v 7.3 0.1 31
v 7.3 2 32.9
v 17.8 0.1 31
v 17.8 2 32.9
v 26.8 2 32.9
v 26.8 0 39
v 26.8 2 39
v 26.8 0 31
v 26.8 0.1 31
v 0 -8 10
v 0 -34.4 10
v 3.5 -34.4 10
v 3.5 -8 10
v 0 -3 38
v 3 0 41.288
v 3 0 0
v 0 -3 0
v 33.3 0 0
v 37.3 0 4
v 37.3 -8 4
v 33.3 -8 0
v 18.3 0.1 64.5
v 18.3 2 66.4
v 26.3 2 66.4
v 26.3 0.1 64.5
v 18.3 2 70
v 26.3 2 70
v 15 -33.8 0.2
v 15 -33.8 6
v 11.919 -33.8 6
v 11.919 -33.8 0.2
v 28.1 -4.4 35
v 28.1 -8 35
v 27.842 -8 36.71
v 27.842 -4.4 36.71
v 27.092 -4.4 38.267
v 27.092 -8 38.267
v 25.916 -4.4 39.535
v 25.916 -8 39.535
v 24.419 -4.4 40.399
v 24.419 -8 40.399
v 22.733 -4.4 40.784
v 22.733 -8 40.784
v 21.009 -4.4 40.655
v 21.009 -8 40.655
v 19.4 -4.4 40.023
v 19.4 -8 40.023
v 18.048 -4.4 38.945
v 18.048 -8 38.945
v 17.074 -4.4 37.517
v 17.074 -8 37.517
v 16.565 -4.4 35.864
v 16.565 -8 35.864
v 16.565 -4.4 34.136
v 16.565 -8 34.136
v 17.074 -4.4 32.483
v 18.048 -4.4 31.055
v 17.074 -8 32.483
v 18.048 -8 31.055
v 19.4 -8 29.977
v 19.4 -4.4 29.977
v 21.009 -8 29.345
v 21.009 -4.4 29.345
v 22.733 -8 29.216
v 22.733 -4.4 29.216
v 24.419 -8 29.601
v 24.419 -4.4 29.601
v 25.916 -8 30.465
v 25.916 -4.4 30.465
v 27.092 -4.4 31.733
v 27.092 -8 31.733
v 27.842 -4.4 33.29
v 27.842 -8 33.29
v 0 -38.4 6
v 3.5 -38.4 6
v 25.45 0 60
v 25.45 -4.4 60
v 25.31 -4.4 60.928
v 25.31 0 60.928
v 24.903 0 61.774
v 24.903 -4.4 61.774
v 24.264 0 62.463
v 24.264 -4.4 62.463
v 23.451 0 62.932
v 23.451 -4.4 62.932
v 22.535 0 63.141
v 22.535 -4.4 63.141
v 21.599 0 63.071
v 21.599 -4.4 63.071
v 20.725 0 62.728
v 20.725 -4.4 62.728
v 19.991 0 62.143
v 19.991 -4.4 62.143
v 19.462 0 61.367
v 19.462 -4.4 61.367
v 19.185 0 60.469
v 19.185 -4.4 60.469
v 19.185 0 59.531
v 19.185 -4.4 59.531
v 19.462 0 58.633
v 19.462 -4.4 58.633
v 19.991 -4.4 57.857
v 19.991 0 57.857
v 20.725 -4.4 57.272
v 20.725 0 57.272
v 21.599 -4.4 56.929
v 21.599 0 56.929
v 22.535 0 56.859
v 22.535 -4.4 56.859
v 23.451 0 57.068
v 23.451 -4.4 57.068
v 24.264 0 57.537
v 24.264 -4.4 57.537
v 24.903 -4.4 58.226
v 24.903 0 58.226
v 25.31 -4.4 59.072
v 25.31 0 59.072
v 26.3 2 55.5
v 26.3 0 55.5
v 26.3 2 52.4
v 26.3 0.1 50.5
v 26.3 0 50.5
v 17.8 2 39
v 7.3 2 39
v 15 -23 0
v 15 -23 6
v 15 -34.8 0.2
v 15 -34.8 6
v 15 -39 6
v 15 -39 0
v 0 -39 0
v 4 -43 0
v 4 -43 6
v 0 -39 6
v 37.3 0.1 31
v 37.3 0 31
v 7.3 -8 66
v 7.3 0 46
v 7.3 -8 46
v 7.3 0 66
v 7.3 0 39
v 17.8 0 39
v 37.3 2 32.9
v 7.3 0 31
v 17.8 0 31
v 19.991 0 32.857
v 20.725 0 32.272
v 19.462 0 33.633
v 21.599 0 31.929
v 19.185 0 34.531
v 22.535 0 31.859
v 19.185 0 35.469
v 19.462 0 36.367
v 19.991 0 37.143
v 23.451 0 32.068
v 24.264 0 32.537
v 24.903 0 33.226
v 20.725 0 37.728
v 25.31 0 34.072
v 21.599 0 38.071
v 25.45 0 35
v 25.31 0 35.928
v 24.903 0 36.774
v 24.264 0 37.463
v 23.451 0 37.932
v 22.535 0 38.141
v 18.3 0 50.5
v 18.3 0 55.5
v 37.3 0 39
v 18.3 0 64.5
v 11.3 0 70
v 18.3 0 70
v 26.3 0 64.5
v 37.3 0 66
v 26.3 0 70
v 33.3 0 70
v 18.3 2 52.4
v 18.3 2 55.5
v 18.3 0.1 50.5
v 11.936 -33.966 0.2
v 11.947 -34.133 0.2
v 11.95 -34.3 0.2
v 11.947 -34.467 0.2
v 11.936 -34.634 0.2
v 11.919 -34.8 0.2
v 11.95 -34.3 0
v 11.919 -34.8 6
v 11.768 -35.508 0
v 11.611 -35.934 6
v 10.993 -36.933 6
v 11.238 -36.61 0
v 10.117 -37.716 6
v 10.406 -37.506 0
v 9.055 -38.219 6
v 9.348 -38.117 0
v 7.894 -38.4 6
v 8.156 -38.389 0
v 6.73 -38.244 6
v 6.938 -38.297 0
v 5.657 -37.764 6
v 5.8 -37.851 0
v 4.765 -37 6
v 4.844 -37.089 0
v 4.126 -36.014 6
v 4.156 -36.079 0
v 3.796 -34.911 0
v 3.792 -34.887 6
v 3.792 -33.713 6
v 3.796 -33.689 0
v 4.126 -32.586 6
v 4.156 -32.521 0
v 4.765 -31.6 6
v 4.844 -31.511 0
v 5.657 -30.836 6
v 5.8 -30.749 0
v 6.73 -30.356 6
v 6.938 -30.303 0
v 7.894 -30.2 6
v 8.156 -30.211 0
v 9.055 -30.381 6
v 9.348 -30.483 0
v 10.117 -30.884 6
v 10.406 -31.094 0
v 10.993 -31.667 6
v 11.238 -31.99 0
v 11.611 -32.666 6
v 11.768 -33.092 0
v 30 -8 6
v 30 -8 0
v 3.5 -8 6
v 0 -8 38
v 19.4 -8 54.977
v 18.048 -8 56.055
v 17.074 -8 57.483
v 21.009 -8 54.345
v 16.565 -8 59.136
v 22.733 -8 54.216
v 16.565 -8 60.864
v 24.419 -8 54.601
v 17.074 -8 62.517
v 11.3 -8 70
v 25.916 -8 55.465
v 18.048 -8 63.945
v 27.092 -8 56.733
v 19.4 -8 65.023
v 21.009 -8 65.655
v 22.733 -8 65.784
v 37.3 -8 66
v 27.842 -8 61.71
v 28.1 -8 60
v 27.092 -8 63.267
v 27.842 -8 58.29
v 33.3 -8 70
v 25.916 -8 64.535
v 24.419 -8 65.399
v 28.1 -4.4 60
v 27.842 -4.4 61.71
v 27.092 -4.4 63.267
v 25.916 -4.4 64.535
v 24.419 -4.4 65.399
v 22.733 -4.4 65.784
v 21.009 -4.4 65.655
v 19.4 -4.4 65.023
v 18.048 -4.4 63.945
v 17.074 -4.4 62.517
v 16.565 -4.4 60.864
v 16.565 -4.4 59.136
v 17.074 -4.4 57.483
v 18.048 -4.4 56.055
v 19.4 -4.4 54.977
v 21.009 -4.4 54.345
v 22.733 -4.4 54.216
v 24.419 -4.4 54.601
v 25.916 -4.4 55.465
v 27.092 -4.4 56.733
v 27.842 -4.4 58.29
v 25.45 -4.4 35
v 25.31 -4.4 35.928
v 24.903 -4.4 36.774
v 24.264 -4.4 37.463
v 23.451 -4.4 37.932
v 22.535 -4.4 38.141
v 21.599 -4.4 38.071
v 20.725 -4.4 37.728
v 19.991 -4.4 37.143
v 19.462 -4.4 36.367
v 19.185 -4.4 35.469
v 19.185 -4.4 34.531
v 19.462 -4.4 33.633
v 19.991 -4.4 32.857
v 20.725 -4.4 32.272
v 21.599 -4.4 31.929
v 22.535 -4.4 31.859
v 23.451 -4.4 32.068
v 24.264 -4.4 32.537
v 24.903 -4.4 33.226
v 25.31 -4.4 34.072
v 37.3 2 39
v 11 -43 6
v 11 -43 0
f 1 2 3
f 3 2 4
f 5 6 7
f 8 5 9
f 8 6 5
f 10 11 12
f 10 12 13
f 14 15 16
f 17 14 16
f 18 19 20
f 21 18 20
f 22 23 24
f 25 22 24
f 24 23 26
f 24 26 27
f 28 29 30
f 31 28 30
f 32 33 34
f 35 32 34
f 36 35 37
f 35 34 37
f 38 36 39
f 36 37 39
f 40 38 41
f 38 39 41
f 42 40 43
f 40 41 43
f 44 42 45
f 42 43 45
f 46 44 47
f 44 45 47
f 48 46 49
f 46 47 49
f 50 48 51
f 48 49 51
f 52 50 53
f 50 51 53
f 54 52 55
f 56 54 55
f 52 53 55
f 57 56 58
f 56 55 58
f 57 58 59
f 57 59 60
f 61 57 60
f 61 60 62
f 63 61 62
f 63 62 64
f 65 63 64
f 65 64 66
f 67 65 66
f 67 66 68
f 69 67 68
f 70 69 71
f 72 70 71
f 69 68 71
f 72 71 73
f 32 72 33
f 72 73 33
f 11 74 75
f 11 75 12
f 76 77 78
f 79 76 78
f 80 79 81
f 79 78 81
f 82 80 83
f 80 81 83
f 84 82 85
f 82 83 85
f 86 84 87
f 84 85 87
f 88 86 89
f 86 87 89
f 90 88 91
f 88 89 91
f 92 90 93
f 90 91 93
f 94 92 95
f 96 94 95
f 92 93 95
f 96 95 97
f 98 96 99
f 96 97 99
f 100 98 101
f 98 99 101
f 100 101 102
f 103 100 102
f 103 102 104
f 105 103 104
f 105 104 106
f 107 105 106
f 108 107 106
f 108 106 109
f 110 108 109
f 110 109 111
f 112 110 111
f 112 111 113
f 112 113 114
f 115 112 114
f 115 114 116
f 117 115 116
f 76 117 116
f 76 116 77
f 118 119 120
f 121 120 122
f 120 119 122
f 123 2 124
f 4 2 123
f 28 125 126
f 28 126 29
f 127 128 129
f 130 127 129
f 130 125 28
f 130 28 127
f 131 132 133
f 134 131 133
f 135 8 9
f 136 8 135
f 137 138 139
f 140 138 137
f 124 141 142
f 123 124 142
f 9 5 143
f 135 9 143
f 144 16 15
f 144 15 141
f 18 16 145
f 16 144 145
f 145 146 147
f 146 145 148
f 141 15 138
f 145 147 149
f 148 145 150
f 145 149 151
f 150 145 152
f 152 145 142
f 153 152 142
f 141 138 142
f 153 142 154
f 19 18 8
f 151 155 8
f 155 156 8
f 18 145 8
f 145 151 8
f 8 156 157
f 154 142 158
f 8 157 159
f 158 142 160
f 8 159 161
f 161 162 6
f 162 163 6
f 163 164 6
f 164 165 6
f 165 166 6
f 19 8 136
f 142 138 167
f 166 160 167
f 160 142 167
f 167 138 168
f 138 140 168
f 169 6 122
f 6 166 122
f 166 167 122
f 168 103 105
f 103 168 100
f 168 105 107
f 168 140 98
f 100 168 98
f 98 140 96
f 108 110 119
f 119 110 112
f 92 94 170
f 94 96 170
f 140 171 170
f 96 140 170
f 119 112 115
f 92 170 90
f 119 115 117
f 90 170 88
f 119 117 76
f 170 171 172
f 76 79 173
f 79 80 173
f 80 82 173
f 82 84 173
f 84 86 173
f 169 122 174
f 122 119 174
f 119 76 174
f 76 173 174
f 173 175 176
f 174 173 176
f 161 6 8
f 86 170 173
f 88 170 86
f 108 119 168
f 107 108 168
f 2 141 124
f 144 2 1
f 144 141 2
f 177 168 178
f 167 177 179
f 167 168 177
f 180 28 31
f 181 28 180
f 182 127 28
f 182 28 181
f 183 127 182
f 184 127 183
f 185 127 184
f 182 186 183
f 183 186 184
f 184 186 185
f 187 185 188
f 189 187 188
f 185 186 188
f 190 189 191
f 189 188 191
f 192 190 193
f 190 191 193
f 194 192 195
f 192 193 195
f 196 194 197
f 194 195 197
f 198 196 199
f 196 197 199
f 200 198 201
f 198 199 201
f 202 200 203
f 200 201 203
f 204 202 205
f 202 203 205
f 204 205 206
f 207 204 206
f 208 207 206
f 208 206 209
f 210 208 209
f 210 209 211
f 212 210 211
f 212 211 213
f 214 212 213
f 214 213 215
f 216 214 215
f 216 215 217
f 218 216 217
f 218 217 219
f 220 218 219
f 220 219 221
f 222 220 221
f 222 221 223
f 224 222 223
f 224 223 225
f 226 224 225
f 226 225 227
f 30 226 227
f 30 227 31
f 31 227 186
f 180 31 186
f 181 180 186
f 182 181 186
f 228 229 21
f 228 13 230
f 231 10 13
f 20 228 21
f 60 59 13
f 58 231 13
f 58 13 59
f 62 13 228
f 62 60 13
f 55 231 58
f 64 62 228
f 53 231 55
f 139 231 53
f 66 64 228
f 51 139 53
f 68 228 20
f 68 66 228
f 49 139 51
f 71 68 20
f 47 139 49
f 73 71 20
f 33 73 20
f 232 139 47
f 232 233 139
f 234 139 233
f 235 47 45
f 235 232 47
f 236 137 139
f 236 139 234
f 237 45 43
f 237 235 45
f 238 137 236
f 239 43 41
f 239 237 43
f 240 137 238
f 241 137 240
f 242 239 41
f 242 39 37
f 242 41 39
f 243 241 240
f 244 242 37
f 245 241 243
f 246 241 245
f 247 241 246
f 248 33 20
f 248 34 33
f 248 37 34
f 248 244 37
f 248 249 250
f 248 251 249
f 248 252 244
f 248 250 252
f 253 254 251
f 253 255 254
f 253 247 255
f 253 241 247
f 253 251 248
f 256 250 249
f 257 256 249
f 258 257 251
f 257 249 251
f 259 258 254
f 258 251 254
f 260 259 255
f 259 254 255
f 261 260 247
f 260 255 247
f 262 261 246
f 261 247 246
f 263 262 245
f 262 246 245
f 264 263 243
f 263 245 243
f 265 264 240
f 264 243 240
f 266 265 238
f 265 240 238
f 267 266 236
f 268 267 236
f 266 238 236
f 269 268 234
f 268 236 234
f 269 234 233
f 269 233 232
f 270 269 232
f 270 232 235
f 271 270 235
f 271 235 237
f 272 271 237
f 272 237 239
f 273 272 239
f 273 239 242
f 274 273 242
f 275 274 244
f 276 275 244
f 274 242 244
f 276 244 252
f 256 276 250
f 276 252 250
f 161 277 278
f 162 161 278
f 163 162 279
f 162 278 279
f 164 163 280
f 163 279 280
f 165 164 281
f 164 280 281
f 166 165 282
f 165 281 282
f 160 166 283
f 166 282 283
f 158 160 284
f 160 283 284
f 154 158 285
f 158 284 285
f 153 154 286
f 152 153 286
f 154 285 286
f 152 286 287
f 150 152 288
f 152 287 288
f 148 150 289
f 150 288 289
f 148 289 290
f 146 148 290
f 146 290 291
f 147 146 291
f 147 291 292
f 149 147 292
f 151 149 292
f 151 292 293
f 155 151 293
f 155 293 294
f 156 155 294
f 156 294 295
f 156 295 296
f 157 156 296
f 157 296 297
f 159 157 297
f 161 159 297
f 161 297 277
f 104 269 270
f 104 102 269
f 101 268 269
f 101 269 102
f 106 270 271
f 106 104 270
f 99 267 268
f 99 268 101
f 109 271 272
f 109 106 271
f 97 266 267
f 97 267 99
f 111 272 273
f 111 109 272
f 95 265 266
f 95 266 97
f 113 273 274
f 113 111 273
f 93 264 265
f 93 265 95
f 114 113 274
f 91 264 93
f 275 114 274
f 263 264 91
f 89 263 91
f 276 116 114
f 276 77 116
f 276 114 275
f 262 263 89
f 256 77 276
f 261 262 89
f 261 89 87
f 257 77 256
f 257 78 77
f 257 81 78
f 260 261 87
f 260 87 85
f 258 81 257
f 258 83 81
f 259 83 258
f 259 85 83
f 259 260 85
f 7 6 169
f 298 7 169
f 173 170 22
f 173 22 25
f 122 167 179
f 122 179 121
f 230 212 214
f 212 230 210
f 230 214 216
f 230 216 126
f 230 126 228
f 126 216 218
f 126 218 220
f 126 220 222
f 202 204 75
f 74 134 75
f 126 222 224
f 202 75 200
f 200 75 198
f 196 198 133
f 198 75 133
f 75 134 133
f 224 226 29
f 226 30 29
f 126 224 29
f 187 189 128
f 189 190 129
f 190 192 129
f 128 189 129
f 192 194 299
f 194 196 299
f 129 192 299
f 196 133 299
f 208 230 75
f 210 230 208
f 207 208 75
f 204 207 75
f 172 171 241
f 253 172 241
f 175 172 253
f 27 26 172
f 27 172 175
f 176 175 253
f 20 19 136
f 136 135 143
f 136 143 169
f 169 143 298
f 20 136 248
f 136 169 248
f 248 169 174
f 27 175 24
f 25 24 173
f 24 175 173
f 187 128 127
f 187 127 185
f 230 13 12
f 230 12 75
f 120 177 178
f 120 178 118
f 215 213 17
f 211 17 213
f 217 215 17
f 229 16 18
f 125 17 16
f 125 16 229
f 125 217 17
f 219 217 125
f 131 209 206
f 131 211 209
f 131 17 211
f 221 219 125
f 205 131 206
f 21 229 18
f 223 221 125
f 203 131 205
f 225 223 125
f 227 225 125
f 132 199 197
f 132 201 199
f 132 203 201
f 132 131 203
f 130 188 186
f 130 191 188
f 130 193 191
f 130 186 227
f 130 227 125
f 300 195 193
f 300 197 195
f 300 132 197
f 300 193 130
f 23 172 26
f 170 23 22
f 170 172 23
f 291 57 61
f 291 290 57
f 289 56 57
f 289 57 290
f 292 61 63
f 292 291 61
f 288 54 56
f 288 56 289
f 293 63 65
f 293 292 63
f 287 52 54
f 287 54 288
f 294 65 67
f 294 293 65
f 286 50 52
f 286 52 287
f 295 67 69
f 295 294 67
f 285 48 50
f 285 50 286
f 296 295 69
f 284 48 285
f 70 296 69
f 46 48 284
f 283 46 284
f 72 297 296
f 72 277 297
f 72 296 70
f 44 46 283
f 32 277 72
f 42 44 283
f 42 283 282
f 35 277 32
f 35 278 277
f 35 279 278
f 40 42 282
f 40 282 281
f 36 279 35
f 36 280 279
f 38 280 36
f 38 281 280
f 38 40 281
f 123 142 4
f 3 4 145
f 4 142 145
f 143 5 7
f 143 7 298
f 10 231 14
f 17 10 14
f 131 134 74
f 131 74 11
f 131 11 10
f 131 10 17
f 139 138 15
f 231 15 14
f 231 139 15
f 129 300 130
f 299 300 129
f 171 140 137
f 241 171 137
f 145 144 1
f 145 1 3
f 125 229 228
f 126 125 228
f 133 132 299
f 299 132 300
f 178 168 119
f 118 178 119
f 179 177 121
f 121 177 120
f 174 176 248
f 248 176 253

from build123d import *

# Parameters (mm, degrees)
SKETCH_W        = 30
SKETCH_H        = 70
PAD_DEPTH       = 8
PAD001_DEPTH    = 8
SKETCH002_W     = 15
SKETCH002_H     = 43
PAD002_DEPTH    = 6
SKETCH003_R     = 4.1
POCKET_DEPTH    = 70.001
PAD003_DEPTH    = 3.5
CHAMFER_SIZE    = 15
SKETCH005_R     = 3.15
POCKET001_DEPTH = 8.001
SKETCH006_R     = 5.8
POCKET002_DEPTH = 3.6
CHAMFER001_SIZE = 4
CHAMFER002_SIZE = 4
CHAMFER003_SIZE = 3
SKETCH007_W     = 10.5
SKETCH007_H     = 8
SKETCH007_W_2   = 8
SKETCH007_H_2   = 5
SKETCH007_H_3   = 5.5
PAD004_DEPTH    = 2
CHAMFER004_SIZE = 1.9
SKETCH008_W     = 3.080602
SKETCH008_H     = 1
POCKET003_DEPTH = 5.8


with BuildPart() as part:
    # Sketch → Pad (new body)
    with BuildSketch(Plane.XZ):
        with Locations((22.3, 35)):
            Rectangle(SKETCH_W, SKETCH_H)
    extrude(amount=PAD_DEPTH)

    # Sketch001 (on Face6 of Pad) → Pad001 (join)
    with BuildSketch(Plane.XZ.offset(8)):
        Polygon((7.3, 46), (0, 38), (0, 0), (7.3, 0), align=None)
    extrude(amount=-PAD001_DEPTH)

    # Sketch002 (on Face8 of Pad001) → Pad002 (join)
    with BuildSketch(Plane(origin=(0, 0, 0), x_dir=(1, 0, 0), z_dir=(0, 0, -1))):
        with Locations((7.5, 21.5)):
            Rectangle(SKETCH002_W, SKETCH002_H)
    extrude(amount=-PAD002_DEPTH)

    # Sketch003 (on Face10 of Pad002) → Pocket (cut, through all)
    with BuildSketch(Plane(origin=(0, 0, 0), x_dir=(1, 0, 0), z_dir=(0, 0, -1))):
        with Locations((7.85, 34.3)):
            Circle(SKETCH003_R)
    extrude(amount=-POCKET_DEPTH, mode=Mode.SUBTRACT)

    # Sketch004 (on Face8 of Pocket) → Pad003 (join)
    with BuildSketch(Plane(origin=(0, 0, 0), x_dir=(0, 0, -1), z_dir=(-1, 0, 0))):
        Polygon((-6, 8), (-6, 38.4), (-10, 34.4), (-10, 8), align=None)
    extrude(amount=-PAD003_DEPTH)

    # Chamfer
    chamfer_edges = [part.edges().sort_by_distance(p)[0] for p in [
        (15, -8, 3),
    ]]
    chamfer(chamfer_edges, length=CHAMFER_SIZE)

    # Sketch005 (on Face1 of Chamfer) → Pocket001 (cut, through all)
    with BuildSketch(Plane.XZ.offset(8)):
        with Locations((22.3, 35)):
            Circle(SKETCH005_R)
        with Locations((22.3, 60)):
            Circle(SKETCH005_R)
    extrude(amount=-POCKET001_DEPTH, mode=Mode.SUBTRACT)

    # Sketch006 (on Face1 of Pocket001) → Pocket002 (cut)
    with BuildSketch(Plane.XZ.offset(8)):
        with Locations((22.3, 60)):
            Circle(SKETCH006_R)
        with Locations((22.3, 35)):
            Circle(SKETCH006_R)
    extrude(amount=-POCKET002_DEPTH, mode=Mode.SUBTRACT)

    # Chamfer001
    chamfer001_edges = [part.edges().sort_by_distance(p)[0] for p in [
        (37.3, -4, 70),
        (7.3, -4, 70),
        (37.3, -4, 0),
    ]]
    chamfer(chamfer001_edges, length=CHAMFER001_SIZE)

    # Chamfer002
    chamfer002_edges = [part.edges().sort_by_distance(p)[0] for p in [
        (15, -43, 3),
        (0, -43, 3),
    ]]
    chamfer(chamfer002_edges, length=CHAMFER002_SIZE)

    # Chamfer003
    chamfer003_edges = [part.edges().sort_by_distance(p)[0] for p in [
        (0, 0, 19),
    ]]
    chamfer(chamfer003_edges, length=CHAMFER003_SIZE)

    # Sketch007 (on Face5 of Chamfer003) → Pad004 (join)
    with BuildSketch(Plane(origin=(0, 0, 0), x_dir=(1, 0, 0), z_dir=(0, 1, 0))):
        with Locations((12.55, -35)):
            Rectangle(SKETCH007_W, SKETCH007_H)
        with Locations((32.05, -35)):
            Rectangle(SKETCH007_W, SKETCH007_H)
        with Locations((22.3, -53)):
            Rectangle(SKETCH007_W_2, SKETCH007_H_2)
        with Locations((22.3, -67.25)):
            Rectangle(SKETCH007_W_2, SKETCH007_H_3)
    extrude(amount=PAD004_DEPTH)

    # Chamfer004
    chamfer004_edges = [part.edges().sort_by_distance(p)[0] for p in [
        (32.05, 2, 31),
        (12.55, 2, 31),
        (22.3, 2, 50.5),
        (22.3, 2, 64.5),
    ]]
    chamfer(chamfer004_edges, length=CHAMFER004_SIZE)

    # Sketch008 (on Face43 of Chamfer004) → Pocket003 (cut)
    with BuildSketch(Plane(origin=(0, 0, 6), x_dir=(-1, 0, 0), z_dir=(0, 0, 1))):
        with Locations((-13.459699, 34.3)):
            Rectangle(SKETCH008_W, SKETCH008_H)
    extrude(amount=-POCKET003_DEPTH, mode=Mode.SUBTRACT)


solid = part.part
